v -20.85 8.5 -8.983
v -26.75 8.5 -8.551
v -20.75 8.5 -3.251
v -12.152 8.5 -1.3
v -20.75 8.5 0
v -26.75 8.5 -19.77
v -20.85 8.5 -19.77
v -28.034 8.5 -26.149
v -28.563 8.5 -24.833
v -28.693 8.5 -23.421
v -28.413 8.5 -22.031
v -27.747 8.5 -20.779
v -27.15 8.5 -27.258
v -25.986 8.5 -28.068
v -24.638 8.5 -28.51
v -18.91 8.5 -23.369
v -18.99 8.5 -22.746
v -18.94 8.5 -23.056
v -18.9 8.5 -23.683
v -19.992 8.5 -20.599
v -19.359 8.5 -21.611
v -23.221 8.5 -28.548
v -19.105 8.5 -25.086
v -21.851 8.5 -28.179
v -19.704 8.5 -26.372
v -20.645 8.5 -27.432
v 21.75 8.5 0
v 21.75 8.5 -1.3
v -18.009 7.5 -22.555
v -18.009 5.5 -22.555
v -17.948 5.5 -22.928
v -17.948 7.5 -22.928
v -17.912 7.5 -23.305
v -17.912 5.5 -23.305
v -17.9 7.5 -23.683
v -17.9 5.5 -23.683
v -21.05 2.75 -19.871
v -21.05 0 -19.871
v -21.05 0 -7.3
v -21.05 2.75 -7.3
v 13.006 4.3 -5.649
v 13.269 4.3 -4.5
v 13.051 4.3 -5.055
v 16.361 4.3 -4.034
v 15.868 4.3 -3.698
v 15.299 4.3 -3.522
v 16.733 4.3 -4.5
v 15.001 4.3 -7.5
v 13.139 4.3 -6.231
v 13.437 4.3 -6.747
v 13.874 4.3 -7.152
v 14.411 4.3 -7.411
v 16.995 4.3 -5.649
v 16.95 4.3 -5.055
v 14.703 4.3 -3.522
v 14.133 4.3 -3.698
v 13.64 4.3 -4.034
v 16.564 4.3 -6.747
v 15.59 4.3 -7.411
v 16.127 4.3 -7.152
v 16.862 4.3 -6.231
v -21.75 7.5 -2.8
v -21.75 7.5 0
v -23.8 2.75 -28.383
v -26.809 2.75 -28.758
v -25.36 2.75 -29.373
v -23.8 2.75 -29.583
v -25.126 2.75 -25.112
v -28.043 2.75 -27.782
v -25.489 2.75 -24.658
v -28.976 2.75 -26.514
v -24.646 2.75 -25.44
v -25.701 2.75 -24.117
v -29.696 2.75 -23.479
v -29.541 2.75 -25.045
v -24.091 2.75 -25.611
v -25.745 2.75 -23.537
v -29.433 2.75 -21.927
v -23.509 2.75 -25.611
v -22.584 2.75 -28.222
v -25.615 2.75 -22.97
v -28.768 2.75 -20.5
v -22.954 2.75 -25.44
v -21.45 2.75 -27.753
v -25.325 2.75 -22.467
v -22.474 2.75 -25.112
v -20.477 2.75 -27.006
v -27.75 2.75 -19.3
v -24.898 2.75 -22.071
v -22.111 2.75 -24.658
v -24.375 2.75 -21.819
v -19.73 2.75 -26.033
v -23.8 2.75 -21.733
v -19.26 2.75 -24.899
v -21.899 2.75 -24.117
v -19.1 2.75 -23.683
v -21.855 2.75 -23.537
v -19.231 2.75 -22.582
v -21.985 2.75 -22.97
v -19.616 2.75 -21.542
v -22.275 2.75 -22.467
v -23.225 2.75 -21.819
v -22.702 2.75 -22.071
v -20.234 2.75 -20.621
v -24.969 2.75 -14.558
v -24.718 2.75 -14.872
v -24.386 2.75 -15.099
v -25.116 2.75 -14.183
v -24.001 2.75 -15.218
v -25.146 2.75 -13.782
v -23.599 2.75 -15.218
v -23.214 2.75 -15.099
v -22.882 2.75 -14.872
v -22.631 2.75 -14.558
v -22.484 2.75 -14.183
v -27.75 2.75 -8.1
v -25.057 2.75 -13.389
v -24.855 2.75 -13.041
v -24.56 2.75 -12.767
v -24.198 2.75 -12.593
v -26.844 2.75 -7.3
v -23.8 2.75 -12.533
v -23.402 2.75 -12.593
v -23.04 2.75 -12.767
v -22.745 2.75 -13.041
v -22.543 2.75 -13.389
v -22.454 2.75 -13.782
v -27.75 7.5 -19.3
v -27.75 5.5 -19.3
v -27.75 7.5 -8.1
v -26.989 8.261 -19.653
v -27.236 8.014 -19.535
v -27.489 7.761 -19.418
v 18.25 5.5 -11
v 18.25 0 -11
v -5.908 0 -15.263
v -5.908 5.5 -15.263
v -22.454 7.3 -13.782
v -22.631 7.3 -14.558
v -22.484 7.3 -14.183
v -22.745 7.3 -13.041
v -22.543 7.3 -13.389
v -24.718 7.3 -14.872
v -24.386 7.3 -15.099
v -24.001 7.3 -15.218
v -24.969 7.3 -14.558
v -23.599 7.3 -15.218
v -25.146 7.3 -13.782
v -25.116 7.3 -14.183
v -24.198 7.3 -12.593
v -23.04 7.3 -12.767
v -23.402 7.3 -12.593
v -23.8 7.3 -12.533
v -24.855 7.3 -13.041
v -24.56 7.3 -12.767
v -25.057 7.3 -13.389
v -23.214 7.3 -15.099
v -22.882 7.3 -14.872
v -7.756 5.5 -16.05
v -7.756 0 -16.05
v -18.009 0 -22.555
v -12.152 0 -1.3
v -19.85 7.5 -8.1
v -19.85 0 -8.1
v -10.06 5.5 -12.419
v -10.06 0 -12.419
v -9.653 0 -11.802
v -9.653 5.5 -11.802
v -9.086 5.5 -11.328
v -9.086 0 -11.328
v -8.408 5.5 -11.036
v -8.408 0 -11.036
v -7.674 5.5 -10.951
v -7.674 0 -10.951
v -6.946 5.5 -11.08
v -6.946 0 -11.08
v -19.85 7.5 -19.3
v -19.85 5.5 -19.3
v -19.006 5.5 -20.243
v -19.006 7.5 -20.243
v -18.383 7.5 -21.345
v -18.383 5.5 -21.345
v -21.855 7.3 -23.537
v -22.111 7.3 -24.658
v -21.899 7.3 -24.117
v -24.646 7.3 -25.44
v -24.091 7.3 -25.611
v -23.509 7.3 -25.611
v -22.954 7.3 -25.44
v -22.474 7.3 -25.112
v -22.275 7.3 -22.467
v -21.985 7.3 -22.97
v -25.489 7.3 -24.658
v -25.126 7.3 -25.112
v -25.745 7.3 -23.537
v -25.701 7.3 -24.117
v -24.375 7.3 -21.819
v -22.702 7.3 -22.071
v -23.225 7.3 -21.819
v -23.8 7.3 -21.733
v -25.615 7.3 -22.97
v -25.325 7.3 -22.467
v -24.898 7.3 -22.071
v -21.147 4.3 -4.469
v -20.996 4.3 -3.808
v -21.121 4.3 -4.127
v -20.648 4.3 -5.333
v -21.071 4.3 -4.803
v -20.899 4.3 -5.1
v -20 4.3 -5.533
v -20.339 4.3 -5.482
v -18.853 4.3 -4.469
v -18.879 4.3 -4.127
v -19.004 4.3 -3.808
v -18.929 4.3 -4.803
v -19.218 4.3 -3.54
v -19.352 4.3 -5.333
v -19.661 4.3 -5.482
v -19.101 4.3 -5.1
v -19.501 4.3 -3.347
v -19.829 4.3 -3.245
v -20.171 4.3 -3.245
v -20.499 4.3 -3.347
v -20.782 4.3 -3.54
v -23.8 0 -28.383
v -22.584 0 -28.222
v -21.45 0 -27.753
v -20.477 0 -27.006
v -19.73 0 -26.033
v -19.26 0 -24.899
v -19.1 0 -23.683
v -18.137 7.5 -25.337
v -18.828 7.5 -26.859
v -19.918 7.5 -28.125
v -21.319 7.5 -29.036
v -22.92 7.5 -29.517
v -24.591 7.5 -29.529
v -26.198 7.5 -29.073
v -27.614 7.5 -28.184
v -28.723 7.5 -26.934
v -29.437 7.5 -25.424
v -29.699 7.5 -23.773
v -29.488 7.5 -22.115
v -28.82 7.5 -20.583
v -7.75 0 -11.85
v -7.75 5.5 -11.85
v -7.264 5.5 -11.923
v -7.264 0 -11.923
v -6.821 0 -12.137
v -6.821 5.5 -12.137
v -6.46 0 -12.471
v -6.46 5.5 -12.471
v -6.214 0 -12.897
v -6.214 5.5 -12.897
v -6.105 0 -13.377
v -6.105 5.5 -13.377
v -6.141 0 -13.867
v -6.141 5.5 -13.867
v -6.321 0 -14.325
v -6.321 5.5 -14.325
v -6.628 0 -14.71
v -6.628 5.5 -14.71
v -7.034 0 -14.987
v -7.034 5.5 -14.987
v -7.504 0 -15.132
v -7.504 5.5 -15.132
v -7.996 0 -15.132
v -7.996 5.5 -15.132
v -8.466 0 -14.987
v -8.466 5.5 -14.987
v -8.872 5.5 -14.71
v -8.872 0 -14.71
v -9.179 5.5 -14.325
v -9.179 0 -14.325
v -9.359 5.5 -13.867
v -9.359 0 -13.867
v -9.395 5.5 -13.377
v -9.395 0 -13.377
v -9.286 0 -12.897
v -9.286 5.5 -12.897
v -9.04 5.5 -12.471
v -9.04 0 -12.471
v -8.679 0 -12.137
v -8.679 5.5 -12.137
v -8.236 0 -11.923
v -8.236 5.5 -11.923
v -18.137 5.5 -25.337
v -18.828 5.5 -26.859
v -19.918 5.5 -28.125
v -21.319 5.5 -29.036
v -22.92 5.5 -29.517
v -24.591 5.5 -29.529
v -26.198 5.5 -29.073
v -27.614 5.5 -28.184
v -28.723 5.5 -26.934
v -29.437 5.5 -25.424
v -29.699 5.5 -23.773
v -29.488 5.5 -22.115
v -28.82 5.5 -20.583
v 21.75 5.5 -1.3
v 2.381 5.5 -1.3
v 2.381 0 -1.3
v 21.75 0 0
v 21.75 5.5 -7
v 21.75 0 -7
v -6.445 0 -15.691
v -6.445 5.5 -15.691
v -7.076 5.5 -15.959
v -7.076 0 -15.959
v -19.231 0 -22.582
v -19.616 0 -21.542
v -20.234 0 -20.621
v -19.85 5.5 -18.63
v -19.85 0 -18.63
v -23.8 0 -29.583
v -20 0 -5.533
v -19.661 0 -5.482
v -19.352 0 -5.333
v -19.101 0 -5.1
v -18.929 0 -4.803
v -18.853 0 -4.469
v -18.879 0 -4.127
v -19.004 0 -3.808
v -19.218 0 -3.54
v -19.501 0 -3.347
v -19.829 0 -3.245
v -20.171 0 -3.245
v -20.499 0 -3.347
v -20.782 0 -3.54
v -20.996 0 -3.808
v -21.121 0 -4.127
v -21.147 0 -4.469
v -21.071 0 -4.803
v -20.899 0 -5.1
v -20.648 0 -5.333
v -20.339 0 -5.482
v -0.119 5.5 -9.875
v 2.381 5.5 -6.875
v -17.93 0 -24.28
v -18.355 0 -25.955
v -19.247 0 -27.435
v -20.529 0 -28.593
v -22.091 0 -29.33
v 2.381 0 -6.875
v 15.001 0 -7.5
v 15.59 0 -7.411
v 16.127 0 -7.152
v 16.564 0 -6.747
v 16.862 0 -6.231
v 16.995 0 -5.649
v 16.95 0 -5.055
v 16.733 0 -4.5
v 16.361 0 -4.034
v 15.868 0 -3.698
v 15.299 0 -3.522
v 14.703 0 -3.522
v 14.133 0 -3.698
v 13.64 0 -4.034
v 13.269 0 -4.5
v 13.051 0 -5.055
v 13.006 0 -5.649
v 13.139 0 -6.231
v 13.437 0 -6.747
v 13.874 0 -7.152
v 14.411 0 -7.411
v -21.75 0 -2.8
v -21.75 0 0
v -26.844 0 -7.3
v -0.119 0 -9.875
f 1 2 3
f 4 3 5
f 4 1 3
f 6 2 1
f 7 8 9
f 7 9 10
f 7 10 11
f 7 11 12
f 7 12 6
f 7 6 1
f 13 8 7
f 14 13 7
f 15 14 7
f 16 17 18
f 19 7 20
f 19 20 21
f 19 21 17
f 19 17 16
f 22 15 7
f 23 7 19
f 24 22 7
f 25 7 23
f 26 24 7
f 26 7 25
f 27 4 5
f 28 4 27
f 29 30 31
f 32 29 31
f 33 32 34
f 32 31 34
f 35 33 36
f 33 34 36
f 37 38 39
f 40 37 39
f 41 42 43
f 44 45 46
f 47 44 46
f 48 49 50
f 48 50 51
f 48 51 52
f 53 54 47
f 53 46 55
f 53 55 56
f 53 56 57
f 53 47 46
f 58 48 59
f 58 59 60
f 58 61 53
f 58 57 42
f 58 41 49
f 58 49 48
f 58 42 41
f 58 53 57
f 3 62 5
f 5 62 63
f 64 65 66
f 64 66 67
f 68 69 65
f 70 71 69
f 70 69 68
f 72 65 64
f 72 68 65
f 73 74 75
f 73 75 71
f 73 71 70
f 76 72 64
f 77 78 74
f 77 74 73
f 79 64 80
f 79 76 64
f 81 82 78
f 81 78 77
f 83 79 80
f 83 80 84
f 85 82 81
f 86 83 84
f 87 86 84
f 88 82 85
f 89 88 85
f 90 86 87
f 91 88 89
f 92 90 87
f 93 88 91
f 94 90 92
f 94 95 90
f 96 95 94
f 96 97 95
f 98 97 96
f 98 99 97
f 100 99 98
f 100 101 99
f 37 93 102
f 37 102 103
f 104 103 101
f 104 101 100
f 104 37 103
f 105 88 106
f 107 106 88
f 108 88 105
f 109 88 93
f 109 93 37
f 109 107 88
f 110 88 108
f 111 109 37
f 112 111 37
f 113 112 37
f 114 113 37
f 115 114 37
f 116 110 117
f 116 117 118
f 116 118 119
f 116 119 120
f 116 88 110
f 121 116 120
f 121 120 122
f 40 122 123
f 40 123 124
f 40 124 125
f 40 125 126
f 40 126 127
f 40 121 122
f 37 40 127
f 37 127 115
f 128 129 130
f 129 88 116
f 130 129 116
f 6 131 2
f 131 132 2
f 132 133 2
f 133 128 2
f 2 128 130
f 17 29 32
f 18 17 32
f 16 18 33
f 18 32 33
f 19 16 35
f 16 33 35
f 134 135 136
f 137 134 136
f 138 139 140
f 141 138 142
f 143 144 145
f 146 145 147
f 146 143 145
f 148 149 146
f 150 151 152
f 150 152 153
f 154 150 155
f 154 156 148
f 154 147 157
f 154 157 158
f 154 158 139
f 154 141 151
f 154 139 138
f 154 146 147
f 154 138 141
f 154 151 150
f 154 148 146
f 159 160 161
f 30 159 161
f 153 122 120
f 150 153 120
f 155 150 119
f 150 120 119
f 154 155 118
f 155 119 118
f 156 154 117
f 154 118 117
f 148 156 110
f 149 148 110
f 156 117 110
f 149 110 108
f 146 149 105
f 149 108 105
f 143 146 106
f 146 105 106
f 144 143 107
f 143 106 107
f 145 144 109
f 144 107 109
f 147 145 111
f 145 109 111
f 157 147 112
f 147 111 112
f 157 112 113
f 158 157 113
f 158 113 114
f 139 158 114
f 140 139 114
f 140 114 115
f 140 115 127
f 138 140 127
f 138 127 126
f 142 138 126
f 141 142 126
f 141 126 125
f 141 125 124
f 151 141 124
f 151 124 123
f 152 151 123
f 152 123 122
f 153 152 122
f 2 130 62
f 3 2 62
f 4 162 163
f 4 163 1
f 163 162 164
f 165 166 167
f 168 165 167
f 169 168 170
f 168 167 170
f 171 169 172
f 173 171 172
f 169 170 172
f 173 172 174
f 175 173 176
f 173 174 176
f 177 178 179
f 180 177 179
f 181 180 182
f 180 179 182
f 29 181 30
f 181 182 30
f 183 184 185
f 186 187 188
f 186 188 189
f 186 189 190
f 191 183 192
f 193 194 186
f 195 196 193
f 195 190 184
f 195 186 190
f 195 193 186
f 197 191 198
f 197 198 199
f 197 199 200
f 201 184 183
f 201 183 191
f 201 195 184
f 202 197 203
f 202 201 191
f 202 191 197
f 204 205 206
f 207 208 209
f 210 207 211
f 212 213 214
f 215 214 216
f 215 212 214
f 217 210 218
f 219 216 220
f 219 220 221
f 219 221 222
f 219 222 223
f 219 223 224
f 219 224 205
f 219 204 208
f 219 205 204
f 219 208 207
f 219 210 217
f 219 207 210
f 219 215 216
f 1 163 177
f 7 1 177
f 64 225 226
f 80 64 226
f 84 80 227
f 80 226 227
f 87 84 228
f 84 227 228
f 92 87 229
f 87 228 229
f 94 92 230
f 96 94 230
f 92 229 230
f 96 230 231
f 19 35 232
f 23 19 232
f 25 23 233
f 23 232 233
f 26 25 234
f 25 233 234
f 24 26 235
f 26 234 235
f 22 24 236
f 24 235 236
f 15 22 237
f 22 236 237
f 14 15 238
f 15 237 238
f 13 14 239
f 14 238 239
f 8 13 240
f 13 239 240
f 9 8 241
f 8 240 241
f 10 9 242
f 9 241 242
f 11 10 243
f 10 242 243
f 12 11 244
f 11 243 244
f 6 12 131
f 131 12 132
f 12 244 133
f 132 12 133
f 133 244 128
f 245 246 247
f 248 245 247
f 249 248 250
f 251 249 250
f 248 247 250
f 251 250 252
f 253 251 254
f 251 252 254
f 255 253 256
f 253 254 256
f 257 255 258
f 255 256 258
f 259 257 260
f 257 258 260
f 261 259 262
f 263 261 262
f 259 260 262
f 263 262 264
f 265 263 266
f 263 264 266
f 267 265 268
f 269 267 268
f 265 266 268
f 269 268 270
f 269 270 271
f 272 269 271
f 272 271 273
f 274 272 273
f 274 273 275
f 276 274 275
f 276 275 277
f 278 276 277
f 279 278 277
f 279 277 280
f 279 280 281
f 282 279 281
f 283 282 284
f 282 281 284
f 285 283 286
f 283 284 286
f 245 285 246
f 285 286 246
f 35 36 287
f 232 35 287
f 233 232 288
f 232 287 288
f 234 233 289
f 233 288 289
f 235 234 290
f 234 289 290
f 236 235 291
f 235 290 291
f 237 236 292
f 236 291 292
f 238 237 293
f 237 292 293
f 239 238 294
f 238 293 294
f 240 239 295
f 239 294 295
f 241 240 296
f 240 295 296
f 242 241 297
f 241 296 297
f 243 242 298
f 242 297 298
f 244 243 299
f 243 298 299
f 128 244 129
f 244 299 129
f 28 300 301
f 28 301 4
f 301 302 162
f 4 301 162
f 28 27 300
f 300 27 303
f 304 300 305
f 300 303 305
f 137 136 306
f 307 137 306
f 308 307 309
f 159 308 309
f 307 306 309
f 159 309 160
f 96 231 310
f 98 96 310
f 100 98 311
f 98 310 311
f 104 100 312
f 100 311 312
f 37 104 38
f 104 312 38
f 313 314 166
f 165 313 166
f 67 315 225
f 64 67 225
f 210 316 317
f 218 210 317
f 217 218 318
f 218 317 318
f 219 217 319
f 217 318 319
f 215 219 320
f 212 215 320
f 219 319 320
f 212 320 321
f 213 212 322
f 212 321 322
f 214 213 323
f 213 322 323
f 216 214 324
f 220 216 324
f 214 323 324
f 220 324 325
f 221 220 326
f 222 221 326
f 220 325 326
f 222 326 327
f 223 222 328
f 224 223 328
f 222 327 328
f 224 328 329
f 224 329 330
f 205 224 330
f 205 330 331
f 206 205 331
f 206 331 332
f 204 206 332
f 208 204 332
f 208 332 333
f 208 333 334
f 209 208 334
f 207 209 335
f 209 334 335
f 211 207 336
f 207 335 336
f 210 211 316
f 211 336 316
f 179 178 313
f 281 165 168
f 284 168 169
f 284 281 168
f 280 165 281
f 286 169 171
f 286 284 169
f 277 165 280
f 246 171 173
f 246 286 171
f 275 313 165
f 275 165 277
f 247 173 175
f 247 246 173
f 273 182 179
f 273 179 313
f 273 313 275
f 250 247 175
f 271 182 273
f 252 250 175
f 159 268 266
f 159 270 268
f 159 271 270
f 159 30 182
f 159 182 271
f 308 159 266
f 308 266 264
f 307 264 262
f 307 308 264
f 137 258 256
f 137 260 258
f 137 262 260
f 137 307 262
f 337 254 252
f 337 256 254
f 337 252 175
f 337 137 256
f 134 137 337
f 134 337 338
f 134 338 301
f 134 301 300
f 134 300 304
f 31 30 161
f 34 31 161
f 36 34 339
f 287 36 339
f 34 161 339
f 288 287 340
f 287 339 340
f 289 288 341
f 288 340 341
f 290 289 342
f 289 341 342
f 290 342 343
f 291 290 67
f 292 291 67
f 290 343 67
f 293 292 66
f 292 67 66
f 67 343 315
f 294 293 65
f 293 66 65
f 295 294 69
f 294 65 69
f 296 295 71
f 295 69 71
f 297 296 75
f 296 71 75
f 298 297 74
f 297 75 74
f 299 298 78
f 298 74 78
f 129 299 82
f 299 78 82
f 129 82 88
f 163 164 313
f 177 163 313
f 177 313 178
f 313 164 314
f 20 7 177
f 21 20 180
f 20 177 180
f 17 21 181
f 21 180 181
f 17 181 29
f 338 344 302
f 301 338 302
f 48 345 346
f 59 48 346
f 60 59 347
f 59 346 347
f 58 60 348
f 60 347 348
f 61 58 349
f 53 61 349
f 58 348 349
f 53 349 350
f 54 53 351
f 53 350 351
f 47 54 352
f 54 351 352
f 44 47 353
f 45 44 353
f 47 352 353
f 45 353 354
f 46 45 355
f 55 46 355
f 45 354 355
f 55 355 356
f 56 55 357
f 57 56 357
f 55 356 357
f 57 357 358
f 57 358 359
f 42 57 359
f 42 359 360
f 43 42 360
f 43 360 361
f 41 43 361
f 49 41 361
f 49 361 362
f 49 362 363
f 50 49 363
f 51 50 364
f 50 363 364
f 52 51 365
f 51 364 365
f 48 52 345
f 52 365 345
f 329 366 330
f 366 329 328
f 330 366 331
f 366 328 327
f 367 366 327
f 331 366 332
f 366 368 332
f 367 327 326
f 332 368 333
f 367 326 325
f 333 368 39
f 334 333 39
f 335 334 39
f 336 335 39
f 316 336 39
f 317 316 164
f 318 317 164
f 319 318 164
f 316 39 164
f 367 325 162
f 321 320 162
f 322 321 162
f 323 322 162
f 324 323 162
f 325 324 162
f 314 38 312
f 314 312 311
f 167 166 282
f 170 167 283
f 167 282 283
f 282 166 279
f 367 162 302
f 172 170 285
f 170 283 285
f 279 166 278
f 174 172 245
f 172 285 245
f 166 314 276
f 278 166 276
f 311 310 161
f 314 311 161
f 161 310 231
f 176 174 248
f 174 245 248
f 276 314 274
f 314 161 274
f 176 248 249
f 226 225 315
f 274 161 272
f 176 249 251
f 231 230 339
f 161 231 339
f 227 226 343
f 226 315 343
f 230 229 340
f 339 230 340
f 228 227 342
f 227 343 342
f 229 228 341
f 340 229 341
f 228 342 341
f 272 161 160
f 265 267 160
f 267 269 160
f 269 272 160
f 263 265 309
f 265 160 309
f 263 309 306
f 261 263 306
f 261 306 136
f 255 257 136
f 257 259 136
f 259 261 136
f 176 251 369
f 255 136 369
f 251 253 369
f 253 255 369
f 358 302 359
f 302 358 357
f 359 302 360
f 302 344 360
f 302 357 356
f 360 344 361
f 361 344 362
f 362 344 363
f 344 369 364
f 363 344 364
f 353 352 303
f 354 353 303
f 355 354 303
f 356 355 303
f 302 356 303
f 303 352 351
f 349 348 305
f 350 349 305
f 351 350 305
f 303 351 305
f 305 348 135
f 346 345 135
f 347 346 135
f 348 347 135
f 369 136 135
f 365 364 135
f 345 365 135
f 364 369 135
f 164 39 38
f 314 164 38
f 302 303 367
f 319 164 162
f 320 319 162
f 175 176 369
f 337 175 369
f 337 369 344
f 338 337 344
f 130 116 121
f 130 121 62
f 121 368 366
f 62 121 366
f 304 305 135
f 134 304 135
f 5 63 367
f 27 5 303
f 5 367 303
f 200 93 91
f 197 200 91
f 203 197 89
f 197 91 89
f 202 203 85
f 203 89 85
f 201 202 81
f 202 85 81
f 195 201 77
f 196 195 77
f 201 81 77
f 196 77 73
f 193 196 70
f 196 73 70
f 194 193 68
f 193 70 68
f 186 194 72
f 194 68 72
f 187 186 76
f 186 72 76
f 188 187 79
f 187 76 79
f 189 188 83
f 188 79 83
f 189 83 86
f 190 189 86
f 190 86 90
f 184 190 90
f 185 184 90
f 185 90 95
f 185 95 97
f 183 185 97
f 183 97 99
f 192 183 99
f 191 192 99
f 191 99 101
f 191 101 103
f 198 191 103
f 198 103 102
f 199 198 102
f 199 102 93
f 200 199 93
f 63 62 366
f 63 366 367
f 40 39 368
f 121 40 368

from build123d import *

# Parameters (mm, degrees)
BOSS_EXTRUDE1_DEPTH = 5.5
SKETCH2_R           = 1.65
CUT_EXTRUDE1_DEPTH  = 5.5
BOSS_EXTRUDE2_DEPTH = 3
CUT_EXTRUDE2_DEPTH  = 2.75
SKETCH5_R           = 1.95
SKETCH5_R_2         = 1.35
SKETCH5_R_3         = 1.15
SKETCH5_R_4         = 2
CUT_EXTRUDE3_DEPTH  = 4.3
SKETCH7_R           = 1.95
SKETCH7_R_2         = 1.35
CUT_EXTRUDE4_DEPTH  = 3
CHAMFER1_SIZE       = 1
CUT_EXTRUDE5_DEPTH  = 2.75


with BuildPart() as part:
    # Sketch1 → Boss-Extrude1 (new body)
    with BuildSketch(Plane(origin=(0, 0, 0), x_dir=(1, 0, 0), z_dir=(0, 1, 0))):
        with BuildLine():
            Line((-7.755996733, 16.049992949), (-18.008818061, 22.554712546))
            ThreePointArc((-18.008818061, 22.554712546), (-25.669699487, 29.278547542), (-27.75, 19.3))
            Line((-27.75, 19.3), (-27.75, 8.1))
            Line((-27.75, 8.1), (-21.75, 2.8))
            Line((-21.75, 2.8), (-21.75, 0))
            Line((-21.75, 0), (21.75, 0))
            Line((21.75, 0), (21.75, 7))
            Line((21.75, 7), (18.25, 11))
            Line((18.25, 11), (-5.907756778, 15.263133549))
            ThreePointArc((-5.907756778, 15.263133549), (-6.75113203, 15.846223088), (-7.755996733, 16.049992949))
        make_face()
        with BuildLine():
            Line((-19.85, 18.630440726), (-10.05956754, 12.419075498))
            ThreePointArc((-10.05956754, 12.419075498), (-8.75757921, 11.15750472), (-6.94630287, 11.079964685))
            Line((-6.94630287, 11.079964685), (-0.119008465, 9.875148026))
            Line((-0.119008465, 9.875148026), (2.380991535, 6.875148026))
            Line((2.380991535, 6.875148026), (2.380991535, 1.3))
            Line((2.380991535, 1.3), (-12.151886792, 1.3))
            Line((-12.151886792, 1.3), (-19.85, 8.1))
            Line((-19.85, 8.1), (-19.85, 18.630440726))
        make_face(mode=Mode.SUBTRACT)
    extrude(amount=BOSS_EXTRUDE1_DEPTH)

    # Sketch2 → Cut-Extrude1 (cut)
    with BuildSketch(Plane(origin=(0, 5.5, 0), x_dir=(1, 0, 0), z_dir=(0, 1, 0))):
        with Locations(Location((-7.75, 13.5, 0), (0, 0, 270))):
            Circle(SKETCH2_R)
    extrude(amount=-CUT_EXTRUDE1_DEPTH, mode=Mode.SUBTRACT)

    # Sketch3 → Boss-Extrude2 (add)
    with BuildSketch(Plane(origin=(0, 5.5, 0), x_dir=(1, 0, 0), z_dir=(0, 1, 0))):
        with BuildLine():
            ThreePointArc((-27.75, 19.3), (-23.8, 17.782636193), (-19.85, 19.3))
            ThreePointArc((-19.85, 19.3), (-18.664735174, 20.777631), (-18.008818061, 22.554712546))
            ThreePointArc((-18.008818061, 22.554712546), (-17.927267525, 23.116055854), (-17.9, 23.682636193))
            ThreePointArc((-17.9, 23.682636193), (-26.198436991, 29.073137097), (-27.75, 19.3))
        make_face()
        with BuildLine():
            Line((-12.151886792, 1.3), (-19.85, 8.1))
            Line((-19.85, 8.1), (-19.85, 18.630440726))
            Line((-19.85, 18.630440726), (-19.85, 19.3))
            ThreePointArc((-19.85, 19.3), (-23.8, 17.782636193), (-27.75, 19.3))
            Line((-27.75, 19.3), (-27.75, 8.1))
            Line((-27.75, 8.1), (-21.75, 2.8))
            Line((-21.75, 2.8), (-21.75, 0))
            Line((-21.75, 0), (21.75, 0))
            Line((21.75, 0), (21.75, 1.3))
            Line((21.75, 1.3), (2.380991535, 1.3))
            Line((2.380991535, 1.3), (-12.151886792, 1.3))
        make_face()
    extrude(amount=BOSS_EXTRUDE2_DEPTH)

    # Sketch4 → Cut-Extrude2 (cut)
    with BuildSketch(Plane.XZ):
        with BuildLine():
            ThreePointArc((-27.75, -19.3), (-29.307610804, -25.798344876), (-23.8, -29.582636193))
            Line((-23.8, -29.582636193), (-23.8, -7.3))
            Line((-23.8, -7.3), (-26.844339623, -7.3))
            Line((-26.844339623, -7.3), (-27.75, -8.1))
            Line((-27.75, -8.1), (-27.75, -19.3))
        make_face()
    extrude(amount=-CUT_EXTRUDE2_DEPTH, mode=Mode.SUBTRACT)

    # Sketch5 → Cut-Extrude3 (cut)
    with BuildSketch(Plane.XZ):
        with Locations(Location((-23.8, -23.682636193, 0), (0, 0, 90))):
            Circle(SKETCH5_R)
        with Locations(Location((-23.8, -13.882636193, 0), (0, 0, 90))):
            Circle(SKETCH5_R_2)
        with Locations(Location((-20, -4.382636193, 0), (0, 0, 270))):
            Circle(SKETCH5_R_3)
        with Locations(Location((15.000589162, -5.5, 0), (0, 0, 270))):
            Circle(SKETCH5_R_4)
    extrude(amount=-CUT_EXTRUDE3_DEPTH, mode=Mode.SUBTRACT)

    # Sketch7 → Cut-Extrude4 (cut)
    with BuildSketch(Plane.XZ.offset(-4.3)):
        with Locations(Location((-23.8, -23.682636193, 0), (0, 0, 90))):
            Circle(SKETCH7_R)
        with Locations(Location((-23.8, -13.882636193, 0), (0, 0, 90))):
            Circle(SKETCH7_R_2)
    extrude(amount=-CUT_EXTRUDE4_DEPTH, mode=Mode.SUBTRACT)

    # Chamfer1
    chamfer1_edges = [part.edges().sort_by_distance(p)[0] for p in [
        (-23.8, 8.5, -29.582636193),
        (-27.75, 8.5, -13.7),
        (-24.75, 8.5, -5.45),
        (-21.75, 8.5, -1.4),
        (-19.85, 8.5, -13.7),
    ]]
    chamfer(chamfer1_edges, length=CHAMFER1_SIZE)

    # Sketch8 → Cut-Extrude5 (cut)
    with BuildSketch(Plane.XZ):
        with BuildLine():
            Line((-21.05, -7.3), (-23.8, -7.3))
            Line((-23.8, -7.3), (-23.8, -12.532636193))
            ThreePointArc((-23.8, -12.532636193), (-22.45, -13.882636193), (-23.8, -15.232636193))
            Line((-23.8, -15.232636193), (-23.8, -18.982636193))
            ThreePointArc((-23.8, -18.982636193), (-22.355013861, -19.210274953), (-21.05, -19.871140424))
            Line((-21.05, -19.871140424), (-21.05, -7.3))
        make_face()
        with BuildLine():
            ThreePointArc((-19.1, -23.682636193), (-19.615803542, -21.54195873), (-21.05, -19.871140424))
            ThreePointArc((-21.05, -19.871140424), (-22.355013861, -19.210274953), (-23.8, -18.982636193))
            Line((-23.8, -18.982636193), (-23.8, -21.732636193))
            ThreePointArc((-23.8, -21.732636193), (-21.85, -23.682636193), (-23.8, -25.632636193))
            Line((-23.8, -25.632636193), (-23.8, -28.382636193))
            ThreePointArc((-23.8, -28.382636193), (-20.476598128, -27.006038065), (-19.1, -23.682636193))
        make_face()
        with BuildLine():
            Line((-23.8, -21.732636193), (-23.8, -18.982636193))
            ThreePointArc((-23.8, -18.982636193), (-28.5, -23.682636193), (-23.8, -28.382636193))
            Line((-23.8, -28.382636193), (-23.8, -25.632636193))
            ThreePointArc((-23.8, -25.632636193), (-21.85, -23.682636193), (-23.8, -21.732636193))
        make_face()
    extrude(amount=-CUT_EXTRUDE5_DEPTH, mode=Mode.SUBTRACT)


solid = part.part
